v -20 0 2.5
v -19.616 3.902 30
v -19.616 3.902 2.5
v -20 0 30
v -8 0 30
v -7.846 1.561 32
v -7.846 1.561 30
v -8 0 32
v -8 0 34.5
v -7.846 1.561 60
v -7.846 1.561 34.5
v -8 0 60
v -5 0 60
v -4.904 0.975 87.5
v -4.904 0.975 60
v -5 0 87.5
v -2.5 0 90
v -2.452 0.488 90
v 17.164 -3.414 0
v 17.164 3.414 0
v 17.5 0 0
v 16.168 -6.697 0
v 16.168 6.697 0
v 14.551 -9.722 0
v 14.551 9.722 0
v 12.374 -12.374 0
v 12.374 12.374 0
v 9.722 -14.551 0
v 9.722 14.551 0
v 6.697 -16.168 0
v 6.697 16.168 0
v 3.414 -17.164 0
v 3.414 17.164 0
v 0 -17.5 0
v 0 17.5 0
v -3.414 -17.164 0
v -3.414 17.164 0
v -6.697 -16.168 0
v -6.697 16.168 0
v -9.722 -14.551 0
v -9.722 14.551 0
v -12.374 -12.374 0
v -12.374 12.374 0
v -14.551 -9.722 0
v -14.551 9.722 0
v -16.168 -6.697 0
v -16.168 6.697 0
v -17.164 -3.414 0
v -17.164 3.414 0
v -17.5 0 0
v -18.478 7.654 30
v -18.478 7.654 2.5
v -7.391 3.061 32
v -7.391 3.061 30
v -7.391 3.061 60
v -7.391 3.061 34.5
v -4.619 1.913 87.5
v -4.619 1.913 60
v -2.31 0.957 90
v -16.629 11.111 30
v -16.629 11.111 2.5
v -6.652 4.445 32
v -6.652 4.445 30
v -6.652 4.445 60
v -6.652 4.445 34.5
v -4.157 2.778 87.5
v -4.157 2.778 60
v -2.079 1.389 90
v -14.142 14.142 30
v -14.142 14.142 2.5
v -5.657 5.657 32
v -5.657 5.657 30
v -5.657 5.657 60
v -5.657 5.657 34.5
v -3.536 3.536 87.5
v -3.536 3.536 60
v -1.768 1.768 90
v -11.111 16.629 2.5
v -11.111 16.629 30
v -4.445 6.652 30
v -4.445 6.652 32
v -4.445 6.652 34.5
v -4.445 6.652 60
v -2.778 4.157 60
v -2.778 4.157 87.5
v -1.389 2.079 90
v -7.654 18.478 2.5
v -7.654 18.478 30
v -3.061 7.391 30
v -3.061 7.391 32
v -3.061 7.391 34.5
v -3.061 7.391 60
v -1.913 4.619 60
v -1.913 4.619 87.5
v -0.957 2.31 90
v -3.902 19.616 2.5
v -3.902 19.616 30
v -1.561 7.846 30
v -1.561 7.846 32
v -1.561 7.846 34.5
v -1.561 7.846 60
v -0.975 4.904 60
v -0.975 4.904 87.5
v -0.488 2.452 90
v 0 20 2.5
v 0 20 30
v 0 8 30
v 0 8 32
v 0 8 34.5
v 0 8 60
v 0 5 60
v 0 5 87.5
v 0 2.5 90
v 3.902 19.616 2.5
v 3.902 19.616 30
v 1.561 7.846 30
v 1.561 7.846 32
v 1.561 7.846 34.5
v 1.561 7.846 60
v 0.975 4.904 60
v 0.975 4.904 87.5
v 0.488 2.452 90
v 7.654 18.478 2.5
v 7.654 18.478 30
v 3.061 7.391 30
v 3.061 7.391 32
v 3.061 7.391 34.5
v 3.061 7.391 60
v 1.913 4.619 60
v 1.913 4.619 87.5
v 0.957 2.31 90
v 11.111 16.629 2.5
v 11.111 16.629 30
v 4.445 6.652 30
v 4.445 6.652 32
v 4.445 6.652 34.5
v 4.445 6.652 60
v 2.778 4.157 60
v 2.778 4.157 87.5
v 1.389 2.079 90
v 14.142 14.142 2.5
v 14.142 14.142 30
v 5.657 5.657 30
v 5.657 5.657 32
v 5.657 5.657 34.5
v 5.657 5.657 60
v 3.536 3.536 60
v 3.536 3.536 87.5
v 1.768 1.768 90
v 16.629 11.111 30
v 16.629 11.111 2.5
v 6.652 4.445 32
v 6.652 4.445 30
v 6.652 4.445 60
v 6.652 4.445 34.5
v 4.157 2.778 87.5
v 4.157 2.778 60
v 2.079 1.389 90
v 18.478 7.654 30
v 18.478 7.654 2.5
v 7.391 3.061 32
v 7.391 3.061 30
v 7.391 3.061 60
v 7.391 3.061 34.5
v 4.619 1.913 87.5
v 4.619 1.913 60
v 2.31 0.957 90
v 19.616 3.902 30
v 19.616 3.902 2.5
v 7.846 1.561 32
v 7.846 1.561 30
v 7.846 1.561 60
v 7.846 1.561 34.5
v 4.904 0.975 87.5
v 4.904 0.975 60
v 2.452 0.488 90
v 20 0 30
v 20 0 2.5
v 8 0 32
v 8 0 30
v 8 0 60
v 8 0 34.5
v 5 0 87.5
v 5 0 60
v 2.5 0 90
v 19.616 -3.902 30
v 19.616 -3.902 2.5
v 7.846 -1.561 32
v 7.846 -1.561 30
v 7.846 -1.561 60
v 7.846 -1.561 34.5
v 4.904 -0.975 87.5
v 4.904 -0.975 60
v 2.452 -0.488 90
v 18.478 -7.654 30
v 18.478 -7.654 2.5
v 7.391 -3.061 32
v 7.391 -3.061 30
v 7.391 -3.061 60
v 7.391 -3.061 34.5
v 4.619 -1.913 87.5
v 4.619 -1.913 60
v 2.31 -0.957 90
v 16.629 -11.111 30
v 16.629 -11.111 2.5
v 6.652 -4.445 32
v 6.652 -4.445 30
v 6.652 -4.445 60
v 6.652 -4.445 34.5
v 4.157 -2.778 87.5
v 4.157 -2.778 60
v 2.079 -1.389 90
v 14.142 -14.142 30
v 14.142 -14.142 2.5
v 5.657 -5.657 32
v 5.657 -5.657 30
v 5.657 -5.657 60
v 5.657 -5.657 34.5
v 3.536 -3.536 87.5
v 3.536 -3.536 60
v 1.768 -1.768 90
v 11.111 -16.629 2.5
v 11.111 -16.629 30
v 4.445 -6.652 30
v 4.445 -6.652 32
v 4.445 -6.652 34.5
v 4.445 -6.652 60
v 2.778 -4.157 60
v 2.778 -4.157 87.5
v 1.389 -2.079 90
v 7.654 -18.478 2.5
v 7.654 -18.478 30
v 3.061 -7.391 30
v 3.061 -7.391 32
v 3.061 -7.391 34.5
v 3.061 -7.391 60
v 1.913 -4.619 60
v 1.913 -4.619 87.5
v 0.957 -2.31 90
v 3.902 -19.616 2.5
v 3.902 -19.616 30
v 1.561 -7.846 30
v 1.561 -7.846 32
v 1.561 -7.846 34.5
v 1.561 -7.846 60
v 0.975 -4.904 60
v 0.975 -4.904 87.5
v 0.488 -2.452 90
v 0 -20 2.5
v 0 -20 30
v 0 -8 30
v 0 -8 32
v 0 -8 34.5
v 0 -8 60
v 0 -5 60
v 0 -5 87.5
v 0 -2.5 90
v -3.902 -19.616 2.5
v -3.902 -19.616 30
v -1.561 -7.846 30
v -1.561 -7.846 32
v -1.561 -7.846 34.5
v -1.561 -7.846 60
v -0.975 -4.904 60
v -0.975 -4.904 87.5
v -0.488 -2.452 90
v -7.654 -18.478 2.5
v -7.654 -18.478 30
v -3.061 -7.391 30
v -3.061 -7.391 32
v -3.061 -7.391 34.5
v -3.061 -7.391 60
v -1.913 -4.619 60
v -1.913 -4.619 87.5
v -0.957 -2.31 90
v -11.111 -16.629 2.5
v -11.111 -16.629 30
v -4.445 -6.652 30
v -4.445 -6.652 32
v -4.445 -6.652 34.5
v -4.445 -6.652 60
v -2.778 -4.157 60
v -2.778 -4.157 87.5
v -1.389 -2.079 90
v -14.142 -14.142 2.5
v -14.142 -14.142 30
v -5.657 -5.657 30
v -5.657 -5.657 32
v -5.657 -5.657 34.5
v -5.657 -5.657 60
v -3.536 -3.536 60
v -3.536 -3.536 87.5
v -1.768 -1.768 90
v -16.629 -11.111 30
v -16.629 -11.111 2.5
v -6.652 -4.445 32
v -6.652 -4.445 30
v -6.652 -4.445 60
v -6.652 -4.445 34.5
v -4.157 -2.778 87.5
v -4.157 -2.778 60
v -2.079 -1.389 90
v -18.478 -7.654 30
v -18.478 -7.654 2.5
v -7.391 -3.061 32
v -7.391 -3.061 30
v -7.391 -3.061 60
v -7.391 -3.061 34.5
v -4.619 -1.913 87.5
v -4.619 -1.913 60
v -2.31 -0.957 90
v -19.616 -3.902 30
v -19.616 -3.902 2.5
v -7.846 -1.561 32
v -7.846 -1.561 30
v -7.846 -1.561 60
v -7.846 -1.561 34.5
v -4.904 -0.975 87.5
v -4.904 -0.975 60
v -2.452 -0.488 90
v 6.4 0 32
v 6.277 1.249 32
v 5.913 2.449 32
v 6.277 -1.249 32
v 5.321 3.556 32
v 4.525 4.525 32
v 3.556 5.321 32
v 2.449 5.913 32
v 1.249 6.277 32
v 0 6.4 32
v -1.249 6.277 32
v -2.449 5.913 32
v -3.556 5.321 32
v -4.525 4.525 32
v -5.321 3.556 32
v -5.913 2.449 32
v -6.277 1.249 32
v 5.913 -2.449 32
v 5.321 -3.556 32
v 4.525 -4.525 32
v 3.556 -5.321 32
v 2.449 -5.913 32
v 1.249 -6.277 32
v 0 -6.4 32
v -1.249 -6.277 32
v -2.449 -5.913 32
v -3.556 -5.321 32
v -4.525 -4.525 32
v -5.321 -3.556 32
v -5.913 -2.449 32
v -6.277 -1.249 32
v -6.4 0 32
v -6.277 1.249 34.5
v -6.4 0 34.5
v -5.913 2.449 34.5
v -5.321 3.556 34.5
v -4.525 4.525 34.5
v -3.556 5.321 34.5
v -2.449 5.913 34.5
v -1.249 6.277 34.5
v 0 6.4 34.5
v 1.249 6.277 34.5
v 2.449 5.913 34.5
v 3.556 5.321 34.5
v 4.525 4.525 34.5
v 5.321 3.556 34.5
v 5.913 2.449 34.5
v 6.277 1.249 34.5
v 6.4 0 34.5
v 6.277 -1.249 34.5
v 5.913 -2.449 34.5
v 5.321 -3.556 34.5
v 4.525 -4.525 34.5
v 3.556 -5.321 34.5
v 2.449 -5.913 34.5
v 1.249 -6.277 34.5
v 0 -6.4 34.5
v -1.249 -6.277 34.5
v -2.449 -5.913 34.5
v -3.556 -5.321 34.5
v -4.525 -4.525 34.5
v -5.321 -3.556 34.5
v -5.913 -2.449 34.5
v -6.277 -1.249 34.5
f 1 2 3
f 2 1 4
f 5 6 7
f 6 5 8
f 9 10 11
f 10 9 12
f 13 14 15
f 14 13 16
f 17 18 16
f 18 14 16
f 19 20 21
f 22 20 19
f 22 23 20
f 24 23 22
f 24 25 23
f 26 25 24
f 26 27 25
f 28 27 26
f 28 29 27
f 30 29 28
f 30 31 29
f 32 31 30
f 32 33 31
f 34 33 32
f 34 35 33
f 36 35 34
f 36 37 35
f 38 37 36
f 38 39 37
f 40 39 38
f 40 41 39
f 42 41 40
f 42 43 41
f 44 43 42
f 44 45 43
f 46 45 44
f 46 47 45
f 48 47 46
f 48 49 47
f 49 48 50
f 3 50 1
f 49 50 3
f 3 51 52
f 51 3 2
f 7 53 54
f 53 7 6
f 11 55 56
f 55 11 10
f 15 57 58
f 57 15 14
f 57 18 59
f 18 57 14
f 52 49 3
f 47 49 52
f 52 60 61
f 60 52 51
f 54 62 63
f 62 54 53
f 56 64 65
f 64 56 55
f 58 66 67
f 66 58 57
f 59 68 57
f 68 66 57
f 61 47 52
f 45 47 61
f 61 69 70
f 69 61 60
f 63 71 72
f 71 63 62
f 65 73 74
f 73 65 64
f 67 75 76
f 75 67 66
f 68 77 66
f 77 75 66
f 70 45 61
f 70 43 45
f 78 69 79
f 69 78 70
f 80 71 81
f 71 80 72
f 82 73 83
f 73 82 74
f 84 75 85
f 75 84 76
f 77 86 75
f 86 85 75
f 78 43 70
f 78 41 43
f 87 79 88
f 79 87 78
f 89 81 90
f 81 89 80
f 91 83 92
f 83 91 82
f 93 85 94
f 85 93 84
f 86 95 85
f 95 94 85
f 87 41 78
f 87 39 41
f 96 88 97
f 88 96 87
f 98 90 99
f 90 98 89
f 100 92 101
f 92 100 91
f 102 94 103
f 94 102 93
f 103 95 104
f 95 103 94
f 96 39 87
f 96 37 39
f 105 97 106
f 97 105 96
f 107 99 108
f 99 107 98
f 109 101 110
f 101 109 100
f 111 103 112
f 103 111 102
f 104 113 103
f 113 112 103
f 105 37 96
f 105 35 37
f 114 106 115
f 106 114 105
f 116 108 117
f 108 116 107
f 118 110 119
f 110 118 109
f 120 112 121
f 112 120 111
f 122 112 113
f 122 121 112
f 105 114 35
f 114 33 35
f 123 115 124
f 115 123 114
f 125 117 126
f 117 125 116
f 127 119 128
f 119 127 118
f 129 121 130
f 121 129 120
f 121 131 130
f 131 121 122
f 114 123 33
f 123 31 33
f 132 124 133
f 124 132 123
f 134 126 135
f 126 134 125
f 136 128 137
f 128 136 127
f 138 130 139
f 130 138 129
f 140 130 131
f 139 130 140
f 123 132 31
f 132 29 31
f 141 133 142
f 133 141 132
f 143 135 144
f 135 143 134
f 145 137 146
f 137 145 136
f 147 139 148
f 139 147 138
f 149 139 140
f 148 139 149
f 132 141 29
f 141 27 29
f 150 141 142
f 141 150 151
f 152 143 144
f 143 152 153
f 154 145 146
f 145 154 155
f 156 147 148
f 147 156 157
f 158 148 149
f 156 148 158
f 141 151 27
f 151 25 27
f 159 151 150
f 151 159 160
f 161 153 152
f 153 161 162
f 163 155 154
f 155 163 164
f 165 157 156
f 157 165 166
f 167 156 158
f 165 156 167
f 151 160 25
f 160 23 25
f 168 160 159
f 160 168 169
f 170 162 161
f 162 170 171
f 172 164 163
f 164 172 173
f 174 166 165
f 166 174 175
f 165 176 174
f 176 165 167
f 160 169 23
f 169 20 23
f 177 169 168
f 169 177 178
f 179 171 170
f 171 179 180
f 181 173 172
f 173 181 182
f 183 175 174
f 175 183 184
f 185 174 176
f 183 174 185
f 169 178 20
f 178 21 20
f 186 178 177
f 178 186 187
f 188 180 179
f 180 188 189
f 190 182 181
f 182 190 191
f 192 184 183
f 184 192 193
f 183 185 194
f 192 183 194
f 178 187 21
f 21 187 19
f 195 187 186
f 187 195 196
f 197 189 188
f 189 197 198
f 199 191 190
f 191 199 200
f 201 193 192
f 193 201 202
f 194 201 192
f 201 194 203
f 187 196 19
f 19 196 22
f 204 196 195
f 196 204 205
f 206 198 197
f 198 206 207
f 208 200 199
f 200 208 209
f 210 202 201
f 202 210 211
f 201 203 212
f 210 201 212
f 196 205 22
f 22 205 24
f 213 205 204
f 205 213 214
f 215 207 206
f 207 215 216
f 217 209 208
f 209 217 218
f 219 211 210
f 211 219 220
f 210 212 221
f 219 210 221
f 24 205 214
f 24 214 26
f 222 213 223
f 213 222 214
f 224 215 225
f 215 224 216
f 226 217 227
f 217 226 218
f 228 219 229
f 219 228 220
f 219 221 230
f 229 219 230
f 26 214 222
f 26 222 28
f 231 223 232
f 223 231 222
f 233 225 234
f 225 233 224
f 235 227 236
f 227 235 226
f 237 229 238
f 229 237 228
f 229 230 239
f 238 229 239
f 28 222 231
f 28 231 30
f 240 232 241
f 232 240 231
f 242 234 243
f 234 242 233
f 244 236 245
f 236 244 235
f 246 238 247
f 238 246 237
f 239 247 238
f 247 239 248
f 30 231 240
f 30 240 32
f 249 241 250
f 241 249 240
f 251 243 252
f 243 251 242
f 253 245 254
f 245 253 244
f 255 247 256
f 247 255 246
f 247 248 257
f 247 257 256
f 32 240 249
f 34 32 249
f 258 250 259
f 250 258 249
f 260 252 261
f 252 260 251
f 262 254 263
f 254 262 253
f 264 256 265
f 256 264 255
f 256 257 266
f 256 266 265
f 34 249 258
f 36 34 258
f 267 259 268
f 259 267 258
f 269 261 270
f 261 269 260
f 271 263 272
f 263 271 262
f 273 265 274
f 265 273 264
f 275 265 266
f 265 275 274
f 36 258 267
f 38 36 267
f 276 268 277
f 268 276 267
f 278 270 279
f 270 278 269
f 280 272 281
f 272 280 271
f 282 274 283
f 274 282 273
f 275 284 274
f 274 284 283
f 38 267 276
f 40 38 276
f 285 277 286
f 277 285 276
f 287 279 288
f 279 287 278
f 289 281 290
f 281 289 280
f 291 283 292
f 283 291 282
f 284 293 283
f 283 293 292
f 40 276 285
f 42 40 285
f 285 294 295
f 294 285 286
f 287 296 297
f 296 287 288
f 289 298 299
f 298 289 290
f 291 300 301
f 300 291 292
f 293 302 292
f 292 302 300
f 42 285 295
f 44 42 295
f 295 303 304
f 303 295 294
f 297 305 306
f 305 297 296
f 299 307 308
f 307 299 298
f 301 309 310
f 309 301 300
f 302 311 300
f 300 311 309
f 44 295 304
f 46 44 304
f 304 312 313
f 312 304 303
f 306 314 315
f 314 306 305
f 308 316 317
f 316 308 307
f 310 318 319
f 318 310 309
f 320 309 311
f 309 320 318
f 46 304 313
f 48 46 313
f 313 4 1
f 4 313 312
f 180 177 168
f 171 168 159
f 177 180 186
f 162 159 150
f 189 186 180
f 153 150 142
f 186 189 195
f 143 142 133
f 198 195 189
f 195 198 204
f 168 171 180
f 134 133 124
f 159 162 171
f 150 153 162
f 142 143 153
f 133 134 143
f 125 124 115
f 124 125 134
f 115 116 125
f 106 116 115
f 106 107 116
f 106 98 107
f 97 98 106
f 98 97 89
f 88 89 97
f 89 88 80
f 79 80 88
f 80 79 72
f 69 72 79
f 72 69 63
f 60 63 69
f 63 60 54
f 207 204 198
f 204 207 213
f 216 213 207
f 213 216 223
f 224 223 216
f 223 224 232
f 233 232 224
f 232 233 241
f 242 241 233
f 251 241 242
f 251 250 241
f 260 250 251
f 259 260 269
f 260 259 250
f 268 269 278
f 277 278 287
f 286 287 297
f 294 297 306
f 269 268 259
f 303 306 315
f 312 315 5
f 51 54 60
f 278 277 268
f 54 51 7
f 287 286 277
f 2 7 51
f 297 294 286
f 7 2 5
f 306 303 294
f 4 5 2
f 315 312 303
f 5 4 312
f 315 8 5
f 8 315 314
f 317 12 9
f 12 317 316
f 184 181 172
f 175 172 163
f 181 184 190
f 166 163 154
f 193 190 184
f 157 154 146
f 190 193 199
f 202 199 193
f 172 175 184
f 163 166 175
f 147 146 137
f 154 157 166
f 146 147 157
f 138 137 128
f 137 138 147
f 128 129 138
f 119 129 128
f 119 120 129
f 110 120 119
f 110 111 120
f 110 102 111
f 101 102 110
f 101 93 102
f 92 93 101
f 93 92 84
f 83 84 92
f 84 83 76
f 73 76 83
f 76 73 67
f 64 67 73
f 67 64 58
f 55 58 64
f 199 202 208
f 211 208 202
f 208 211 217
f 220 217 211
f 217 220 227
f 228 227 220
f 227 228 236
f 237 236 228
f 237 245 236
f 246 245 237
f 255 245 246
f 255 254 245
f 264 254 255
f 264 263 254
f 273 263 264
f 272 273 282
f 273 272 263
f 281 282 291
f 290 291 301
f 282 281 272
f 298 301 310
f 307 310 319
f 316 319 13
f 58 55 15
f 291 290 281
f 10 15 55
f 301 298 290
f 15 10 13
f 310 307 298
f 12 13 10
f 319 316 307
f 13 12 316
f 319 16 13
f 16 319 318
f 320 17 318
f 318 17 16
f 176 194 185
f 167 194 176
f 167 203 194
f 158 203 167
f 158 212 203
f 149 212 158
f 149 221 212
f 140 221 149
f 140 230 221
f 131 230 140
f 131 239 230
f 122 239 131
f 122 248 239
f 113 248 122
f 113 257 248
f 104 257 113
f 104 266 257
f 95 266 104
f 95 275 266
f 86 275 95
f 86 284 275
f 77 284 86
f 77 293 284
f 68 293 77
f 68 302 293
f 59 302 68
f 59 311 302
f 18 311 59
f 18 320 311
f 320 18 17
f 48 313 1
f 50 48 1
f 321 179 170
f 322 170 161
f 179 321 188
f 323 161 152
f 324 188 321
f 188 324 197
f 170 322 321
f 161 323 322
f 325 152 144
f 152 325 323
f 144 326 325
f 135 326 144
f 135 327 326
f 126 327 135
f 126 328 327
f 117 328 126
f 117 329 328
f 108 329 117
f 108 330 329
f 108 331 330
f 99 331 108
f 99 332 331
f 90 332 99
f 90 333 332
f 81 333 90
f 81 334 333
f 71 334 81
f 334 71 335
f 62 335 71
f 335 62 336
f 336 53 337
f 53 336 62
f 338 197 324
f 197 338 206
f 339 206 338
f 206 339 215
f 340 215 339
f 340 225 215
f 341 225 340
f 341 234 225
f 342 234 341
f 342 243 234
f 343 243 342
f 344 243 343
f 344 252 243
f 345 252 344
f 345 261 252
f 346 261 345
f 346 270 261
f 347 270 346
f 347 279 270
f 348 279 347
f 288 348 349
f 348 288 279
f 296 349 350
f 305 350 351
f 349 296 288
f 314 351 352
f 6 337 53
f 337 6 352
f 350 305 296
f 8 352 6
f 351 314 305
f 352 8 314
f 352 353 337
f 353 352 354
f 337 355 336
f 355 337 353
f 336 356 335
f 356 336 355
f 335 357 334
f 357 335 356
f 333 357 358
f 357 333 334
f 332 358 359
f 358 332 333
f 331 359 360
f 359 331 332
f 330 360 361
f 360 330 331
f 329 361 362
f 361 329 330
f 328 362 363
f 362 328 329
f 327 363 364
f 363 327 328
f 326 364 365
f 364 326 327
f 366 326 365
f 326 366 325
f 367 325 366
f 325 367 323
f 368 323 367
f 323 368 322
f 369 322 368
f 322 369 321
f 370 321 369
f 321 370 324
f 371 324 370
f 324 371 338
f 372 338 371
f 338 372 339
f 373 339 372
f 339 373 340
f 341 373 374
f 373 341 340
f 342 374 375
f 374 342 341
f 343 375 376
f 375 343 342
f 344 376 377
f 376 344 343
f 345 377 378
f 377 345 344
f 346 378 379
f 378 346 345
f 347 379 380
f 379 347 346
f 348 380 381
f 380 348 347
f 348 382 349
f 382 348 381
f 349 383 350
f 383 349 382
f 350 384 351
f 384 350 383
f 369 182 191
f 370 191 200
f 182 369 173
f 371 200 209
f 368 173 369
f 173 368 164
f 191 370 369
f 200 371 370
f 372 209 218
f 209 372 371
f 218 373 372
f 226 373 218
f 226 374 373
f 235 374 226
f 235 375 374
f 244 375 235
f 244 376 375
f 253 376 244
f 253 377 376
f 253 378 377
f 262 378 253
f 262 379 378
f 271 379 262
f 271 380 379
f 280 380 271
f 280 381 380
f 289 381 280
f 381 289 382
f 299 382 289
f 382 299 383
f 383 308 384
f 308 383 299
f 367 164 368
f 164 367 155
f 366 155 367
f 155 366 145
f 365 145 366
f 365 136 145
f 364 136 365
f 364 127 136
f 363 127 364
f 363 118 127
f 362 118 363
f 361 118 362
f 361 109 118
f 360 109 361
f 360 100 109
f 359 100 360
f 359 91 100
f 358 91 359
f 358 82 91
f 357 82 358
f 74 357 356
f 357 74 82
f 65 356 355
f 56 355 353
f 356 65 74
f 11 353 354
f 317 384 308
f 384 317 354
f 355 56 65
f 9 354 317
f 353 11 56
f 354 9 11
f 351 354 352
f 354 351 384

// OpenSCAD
$fn = 32;

// ----------------------------------------------------------------------
// Stepped shaft: diameters 40, 16, 10 mm, 90 mm long
// ----------------------------------------------------------------------

// --- parameters (mm) ---
d1 = 40;                  // step 1 diameter
len1 = 30;                // step 1 length
d2 = 16;                  // step 2 diameter
len2 = 30;                // step 2 length
d3 = 10;                  // step 3 diameter
len3 = 30;                // step 3 length
total = 90;               // overall length
chamfer = 2.5;            // end chamfer
groove_r = 8;             // groove radius
groove_z = 32;            // groove position from the end
groove_w = 2.5;           // groove width
groove_d = 1.6;           // groove depth

/* closed turning profile: x is the radius, y is the length */
profile = [[0, 0], [20 - chamfer, 0], [20, chamfer], [20, 30], [8, 30], [8, 60], [5, 60], [5, 87.5], [2.5, 90], [0, 90]];

difference() {
  rotate_extrude() polygon(profile);
  /* circlip groove just behind the shoulder */
  rotate_extrude() translate([groove_r - groove_d, groove_z]) square([groove_d + 1, groove_w]);
}
